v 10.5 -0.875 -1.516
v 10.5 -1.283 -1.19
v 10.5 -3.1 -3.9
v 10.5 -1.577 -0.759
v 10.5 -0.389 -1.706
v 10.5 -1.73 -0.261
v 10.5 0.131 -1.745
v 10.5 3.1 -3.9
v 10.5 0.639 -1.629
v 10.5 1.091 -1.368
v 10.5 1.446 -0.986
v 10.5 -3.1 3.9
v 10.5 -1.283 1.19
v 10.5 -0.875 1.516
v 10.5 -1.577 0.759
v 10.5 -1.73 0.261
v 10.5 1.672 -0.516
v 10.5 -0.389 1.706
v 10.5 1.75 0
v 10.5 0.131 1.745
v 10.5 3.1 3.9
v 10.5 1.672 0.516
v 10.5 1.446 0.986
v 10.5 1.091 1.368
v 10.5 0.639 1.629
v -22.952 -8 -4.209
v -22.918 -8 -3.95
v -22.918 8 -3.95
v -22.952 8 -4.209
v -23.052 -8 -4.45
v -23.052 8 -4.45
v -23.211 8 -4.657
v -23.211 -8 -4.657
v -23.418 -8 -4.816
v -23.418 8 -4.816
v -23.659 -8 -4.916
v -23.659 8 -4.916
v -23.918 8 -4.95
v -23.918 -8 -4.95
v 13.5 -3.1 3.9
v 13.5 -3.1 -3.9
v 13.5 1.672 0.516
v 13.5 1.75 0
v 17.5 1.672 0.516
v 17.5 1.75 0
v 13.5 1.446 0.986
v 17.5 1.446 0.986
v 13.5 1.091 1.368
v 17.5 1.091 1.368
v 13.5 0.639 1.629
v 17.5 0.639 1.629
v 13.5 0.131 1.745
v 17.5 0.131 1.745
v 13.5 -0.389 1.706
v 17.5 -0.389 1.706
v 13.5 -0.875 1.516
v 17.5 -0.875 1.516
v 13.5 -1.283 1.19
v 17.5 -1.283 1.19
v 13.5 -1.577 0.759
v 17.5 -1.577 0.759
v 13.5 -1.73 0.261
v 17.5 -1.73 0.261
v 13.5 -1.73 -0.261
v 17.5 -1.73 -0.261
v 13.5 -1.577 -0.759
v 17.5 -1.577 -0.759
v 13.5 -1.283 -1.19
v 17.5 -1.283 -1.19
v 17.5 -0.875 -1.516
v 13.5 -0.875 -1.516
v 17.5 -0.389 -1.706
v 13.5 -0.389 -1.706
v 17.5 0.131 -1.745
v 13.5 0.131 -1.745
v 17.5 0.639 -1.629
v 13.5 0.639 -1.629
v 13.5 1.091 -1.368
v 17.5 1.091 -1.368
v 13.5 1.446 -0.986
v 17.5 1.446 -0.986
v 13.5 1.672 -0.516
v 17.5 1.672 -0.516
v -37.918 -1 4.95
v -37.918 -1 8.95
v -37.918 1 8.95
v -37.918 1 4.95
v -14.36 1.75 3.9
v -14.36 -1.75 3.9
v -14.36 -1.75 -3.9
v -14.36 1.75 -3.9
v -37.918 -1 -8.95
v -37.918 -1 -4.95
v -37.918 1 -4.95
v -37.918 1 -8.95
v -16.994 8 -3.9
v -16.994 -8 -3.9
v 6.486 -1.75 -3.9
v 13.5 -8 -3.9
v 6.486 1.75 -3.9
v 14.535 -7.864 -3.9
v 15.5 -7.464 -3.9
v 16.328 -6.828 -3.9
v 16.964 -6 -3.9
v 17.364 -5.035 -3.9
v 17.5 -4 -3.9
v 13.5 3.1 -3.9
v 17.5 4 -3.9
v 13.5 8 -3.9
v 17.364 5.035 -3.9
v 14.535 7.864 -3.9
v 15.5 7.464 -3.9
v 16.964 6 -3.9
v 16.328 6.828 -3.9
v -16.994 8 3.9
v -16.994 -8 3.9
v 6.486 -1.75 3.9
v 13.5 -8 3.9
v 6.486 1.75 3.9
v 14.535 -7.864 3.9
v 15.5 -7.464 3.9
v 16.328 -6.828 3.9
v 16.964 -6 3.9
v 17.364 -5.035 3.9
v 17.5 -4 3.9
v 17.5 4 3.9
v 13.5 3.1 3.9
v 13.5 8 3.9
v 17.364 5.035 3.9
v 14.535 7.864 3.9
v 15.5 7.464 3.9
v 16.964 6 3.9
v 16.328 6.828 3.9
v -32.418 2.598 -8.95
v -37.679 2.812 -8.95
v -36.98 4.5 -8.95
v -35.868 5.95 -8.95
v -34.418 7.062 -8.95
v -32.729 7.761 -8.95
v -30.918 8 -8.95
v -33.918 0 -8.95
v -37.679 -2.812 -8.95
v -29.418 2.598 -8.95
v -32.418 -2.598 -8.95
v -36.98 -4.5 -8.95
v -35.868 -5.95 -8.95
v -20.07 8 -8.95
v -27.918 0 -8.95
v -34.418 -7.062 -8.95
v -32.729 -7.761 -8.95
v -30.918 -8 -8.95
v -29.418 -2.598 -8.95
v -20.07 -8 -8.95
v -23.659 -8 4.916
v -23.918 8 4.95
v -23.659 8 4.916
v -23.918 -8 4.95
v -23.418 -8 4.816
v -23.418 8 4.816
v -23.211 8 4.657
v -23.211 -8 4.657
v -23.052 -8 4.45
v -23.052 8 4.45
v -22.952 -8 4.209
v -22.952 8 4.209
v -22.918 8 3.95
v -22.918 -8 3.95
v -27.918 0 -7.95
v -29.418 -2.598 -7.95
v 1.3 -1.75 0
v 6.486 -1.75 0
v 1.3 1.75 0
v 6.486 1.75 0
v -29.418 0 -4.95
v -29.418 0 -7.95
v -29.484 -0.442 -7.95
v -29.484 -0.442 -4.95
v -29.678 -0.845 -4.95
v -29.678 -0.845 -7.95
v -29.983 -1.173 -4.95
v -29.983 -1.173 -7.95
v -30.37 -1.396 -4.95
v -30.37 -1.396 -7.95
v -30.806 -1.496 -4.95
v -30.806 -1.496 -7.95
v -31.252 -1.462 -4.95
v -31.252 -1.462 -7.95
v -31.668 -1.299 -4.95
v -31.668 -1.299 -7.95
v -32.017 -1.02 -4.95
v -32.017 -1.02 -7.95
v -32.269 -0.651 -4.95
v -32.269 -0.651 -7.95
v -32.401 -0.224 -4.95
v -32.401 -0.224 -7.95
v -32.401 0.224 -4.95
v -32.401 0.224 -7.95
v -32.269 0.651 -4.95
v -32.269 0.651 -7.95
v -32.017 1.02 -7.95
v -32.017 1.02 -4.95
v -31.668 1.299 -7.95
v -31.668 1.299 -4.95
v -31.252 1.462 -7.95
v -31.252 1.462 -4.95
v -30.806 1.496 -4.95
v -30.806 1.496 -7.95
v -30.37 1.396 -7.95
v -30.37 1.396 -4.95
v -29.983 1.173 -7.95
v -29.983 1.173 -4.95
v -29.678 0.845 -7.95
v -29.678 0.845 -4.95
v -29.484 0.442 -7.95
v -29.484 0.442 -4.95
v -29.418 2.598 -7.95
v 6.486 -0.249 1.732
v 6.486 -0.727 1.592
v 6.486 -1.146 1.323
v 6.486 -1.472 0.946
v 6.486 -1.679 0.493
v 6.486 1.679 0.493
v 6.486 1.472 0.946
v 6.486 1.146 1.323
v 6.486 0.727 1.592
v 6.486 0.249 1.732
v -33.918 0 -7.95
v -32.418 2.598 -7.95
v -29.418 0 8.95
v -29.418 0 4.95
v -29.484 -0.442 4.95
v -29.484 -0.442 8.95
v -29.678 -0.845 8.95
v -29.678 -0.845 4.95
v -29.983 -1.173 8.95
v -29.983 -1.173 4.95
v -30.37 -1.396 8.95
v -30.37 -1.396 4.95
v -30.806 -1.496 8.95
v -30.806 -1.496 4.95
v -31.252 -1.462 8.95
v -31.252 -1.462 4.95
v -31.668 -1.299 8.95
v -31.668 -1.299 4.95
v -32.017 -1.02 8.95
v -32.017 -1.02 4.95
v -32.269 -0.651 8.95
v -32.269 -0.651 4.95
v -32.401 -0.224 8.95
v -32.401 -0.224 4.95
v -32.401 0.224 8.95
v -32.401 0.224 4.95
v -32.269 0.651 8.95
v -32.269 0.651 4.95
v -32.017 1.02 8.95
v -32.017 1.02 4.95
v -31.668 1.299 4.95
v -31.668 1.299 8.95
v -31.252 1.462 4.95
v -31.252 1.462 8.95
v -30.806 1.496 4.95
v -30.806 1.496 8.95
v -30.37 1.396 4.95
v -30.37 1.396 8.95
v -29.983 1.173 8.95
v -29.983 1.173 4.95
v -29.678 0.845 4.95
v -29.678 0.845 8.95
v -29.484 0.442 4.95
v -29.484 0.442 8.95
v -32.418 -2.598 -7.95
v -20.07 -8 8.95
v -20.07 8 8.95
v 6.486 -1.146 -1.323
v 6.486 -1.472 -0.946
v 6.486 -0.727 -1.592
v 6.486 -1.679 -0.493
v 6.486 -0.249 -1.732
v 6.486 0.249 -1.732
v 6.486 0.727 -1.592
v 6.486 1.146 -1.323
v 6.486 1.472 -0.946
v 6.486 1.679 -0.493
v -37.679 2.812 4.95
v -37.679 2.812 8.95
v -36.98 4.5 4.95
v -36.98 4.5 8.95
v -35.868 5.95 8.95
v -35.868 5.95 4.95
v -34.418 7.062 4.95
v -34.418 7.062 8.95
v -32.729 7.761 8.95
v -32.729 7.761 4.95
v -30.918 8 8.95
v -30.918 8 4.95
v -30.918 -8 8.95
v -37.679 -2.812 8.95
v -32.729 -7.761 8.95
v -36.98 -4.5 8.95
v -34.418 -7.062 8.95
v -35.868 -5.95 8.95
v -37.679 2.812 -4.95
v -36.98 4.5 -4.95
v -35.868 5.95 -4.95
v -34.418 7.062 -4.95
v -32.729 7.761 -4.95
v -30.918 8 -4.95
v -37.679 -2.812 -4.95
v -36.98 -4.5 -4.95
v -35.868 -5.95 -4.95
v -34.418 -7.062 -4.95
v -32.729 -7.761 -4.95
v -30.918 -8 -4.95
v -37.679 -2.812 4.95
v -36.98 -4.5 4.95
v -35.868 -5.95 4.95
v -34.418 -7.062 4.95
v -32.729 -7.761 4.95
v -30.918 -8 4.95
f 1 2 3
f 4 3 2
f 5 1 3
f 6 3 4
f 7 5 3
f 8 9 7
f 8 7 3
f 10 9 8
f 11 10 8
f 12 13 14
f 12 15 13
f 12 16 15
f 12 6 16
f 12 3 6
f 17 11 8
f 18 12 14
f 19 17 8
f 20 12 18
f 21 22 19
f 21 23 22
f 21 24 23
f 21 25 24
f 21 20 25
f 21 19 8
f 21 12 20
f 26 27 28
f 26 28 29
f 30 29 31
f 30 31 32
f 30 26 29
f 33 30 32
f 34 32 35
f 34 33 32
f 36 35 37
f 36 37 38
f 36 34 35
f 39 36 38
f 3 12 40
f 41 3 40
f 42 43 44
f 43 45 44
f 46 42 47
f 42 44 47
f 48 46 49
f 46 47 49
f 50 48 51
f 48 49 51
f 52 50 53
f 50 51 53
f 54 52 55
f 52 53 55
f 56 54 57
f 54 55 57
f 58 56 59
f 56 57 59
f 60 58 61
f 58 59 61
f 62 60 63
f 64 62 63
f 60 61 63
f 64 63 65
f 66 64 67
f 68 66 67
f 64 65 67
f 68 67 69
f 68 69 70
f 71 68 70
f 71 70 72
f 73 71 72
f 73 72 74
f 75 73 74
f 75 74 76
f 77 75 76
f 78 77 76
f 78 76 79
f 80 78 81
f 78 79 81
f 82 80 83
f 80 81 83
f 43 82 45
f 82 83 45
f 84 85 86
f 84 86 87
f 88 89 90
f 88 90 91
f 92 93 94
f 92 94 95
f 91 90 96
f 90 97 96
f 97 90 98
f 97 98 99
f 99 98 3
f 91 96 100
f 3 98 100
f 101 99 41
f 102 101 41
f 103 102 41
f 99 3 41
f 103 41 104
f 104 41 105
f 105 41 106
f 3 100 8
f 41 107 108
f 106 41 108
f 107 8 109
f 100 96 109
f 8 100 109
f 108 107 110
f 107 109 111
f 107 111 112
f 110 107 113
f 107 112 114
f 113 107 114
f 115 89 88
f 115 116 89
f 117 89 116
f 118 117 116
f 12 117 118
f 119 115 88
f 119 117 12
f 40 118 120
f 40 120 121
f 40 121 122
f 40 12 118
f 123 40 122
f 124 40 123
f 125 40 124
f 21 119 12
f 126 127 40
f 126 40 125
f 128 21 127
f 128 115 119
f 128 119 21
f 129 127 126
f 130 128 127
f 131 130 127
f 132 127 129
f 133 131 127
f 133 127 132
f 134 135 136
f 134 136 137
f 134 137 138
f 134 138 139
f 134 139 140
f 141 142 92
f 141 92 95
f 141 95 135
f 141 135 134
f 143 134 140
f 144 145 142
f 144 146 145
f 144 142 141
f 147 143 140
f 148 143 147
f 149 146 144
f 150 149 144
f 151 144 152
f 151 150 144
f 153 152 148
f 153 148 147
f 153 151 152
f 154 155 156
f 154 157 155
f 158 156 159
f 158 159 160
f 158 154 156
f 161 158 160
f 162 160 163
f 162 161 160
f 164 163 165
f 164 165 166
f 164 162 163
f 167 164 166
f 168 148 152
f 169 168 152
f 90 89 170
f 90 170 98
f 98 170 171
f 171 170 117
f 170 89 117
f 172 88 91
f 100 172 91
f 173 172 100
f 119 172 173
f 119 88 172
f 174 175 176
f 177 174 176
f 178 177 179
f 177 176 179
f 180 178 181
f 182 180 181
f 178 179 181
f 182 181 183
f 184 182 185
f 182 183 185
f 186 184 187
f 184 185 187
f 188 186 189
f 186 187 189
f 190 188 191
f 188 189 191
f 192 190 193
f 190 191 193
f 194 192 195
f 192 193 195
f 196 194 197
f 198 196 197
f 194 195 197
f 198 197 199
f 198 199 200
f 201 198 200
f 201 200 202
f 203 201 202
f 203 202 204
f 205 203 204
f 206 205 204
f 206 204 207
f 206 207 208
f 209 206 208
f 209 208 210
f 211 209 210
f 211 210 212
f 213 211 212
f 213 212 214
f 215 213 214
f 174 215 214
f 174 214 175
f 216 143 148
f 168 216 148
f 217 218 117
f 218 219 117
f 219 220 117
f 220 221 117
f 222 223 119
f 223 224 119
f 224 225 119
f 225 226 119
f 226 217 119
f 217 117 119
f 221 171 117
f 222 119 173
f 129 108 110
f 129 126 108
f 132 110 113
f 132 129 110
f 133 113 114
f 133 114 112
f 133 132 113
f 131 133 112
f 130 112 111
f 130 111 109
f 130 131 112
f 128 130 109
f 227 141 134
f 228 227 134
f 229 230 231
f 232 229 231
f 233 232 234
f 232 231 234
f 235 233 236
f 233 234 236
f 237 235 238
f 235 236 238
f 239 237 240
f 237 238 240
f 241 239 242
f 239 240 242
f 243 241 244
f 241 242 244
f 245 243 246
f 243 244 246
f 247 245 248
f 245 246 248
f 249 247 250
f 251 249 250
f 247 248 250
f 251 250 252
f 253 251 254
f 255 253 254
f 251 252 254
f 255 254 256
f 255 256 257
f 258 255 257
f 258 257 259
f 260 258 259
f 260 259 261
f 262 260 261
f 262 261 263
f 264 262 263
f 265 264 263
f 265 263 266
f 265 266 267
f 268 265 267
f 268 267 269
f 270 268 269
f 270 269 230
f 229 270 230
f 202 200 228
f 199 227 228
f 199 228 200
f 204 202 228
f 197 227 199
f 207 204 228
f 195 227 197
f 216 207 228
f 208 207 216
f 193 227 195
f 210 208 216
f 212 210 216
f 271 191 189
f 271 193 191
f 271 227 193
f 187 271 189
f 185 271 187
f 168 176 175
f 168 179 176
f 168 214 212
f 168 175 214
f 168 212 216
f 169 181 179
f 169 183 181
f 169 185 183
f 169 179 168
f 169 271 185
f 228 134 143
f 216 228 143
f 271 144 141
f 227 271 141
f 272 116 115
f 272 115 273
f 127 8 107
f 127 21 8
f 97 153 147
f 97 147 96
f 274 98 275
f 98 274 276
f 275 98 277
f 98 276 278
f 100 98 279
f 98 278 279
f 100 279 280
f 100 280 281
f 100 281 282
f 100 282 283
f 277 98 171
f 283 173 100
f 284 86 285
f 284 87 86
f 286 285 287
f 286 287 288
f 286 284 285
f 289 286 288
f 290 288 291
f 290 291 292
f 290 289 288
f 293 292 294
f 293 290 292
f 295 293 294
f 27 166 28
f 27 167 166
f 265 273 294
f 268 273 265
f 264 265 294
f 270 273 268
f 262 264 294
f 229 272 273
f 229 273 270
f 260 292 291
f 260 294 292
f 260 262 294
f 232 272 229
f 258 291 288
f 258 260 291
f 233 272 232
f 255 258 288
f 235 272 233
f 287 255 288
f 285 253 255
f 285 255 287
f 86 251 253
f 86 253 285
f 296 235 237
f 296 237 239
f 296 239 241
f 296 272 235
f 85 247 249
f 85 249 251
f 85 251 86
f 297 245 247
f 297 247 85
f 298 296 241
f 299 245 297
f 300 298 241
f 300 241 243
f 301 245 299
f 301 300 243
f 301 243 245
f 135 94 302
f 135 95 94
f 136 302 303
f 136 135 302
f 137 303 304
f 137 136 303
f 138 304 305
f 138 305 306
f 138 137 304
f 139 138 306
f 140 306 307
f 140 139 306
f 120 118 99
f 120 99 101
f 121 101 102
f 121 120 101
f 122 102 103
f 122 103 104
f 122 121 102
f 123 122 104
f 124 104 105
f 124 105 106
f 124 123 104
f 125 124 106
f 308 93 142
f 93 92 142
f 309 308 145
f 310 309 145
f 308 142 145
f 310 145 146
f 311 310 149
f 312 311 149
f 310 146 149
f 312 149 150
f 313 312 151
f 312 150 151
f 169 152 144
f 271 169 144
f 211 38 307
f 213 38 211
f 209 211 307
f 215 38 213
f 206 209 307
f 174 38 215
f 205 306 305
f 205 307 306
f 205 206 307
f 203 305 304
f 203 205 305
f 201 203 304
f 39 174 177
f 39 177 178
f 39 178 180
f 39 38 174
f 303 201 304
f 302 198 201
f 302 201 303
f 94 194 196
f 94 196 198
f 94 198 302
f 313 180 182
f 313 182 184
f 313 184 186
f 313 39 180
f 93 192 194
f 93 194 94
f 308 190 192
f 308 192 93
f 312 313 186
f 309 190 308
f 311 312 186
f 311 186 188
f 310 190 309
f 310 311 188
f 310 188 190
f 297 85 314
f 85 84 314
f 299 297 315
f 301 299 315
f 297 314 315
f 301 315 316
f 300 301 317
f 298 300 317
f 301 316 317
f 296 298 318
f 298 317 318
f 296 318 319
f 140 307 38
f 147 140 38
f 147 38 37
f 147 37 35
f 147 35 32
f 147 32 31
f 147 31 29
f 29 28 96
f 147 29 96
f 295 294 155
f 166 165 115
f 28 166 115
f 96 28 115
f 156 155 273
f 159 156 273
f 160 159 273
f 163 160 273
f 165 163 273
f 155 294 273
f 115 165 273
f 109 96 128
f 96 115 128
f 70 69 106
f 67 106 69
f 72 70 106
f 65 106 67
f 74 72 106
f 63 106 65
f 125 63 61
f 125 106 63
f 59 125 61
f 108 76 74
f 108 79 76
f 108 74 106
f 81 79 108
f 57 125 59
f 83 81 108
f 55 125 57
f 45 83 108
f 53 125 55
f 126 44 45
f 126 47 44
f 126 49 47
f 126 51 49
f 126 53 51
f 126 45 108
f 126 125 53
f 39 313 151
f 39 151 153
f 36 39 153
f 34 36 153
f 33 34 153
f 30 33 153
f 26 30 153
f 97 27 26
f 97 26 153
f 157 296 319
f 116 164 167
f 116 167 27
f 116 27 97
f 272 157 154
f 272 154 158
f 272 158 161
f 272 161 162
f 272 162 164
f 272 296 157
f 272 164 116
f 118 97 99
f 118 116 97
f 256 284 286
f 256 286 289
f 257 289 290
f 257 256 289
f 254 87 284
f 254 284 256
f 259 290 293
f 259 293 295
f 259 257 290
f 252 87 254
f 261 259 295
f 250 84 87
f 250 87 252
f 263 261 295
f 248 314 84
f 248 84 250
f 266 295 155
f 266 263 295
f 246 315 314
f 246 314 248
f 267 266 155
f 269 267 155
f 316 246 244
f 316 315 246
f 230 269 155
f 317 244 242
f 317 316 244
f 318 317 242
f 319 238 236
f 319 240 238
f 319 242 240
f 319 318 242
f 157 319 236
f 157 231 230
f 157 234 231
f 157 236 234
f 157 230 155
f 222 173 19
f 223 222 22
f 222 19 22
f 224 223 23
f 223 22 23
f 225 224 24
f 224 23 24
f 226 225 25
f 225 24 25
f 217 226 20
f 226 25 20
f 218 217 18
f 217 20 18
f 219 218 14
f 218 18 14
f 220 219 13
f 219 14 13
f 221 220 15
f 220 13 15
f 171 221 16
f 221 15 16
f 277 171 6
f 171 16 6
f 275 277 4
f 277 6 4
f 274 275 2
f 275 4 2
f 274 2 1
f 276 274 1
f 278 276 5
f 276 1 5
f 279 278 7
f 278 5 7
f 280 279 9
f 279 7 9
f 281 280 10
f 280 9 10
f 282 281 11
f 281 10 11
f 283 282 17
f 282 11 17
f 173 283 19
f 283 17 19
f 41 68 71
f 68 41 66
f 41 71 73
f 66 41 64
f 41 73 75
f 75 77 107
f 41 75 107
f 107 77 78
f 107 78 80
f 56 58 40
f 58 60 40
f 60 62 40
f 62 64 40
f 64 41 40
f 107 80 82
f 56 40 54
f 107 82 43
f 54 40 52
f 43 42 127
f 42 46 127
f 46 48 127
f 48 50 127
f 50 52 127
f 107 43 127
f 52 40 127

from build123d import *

# Parameters (mm, degrees)
F0_W          = 20.846172
F0_H          = 3.5
F0_W_2        = 3
F0_H_2        = 6.2
F1_DEPTH      = 3.9
F1_DEPTH_BACK = 3.9
F2_R          = 1.75
F3_DEPTH      = 16.2
F5_DEPTH      = 8
F5_DEPTH_BACK = 8
F6_R          = 7
F7_R          = 1.5
F8_DEPTH      = 25
F9_R          = 1.5
F10_DEPTH     = 1


with BuildPart() as f1:
    # F0 (on Top) → F1 (new body, two sides)
    with BuildSketch(Plane.XY) as f1_sk:
        with BuildLine():
            Line((-17.5, 8), (-17.5, -8))
            Line((-17.5, -8), (13.5, -8))
            ThreePointArc((13.5, -8), (16.328427, -6.828427), (17.5, -4))
            Line((17.5, -4), (17.5, 4))
            ThreePointArc((17.5, 4), (16.328427, 6.828427), (13.5, 8))
            Line((13.5, 8), (-17.5, 8))
        make_face()
        with Locations((-3.937322, 0)):
            Rectangle(F0_W, F0_H, mode=Mode.SUBTRACT)
        with Locations((12, 0)):
            Rectangle(F0_W_2, F0_H_2, mode=Mode.SUBTRACT)
    extrude(amount=F1_DEPTH)
    extrude(f1_sk.sketch, amount=-F1_DEPTH_BACK)

    # F2 (on face) → F3 (cut)
    with BuildSketch(Plane.YZ.offset(17.5)):
        Circle(F2_R)
    extrude(amount=-F3_DEPTH, mode=Mode.SUBTRACT)

    # F4 (on Front) → F5 (join, two sides)
    with BuildSketch(Plane.XZ) as f5_sk:
        with BuildLine():
            Line((-22.917766, 3.95), (-22.917766, -3.95))
            ThreePointArc((-22.917766, -3.95), (-23.210659, -4.657107), (-23.917766, -4.95))
            Line((-23.917766, -4.95), (-37.917766, -4.95))
            Line((-37.917766, -4.95), (-37.917766, -8.95))
            Line((-37.917766, -8.95), (-20.07043, -8.95))
            Line((-20.07043, -8.95), (-16.954886, -3.836561))
            Line((-16.954886, -3.836561), (-16.954886, 3.836561))
            Line((-16.954886, 3.836561), (-20.07043, 8.95))
            Line((-20.07043, 8.95), (-37.917766, 8.95))
            Line((-37.917766, 8.95), (-37.917766, 4.95))
            Line((-37.917766, 4.95), (-23.917766, 4.95))
            ThreePointArc((-23.917766, 4.95), (-23.210659, 4.657107), (-22.917766, 3.95))
        make_face()
    extrude(amount=F5_DEPTH)
    extrude(f5_sk.sketch, amount=-F5_DEPTH_BACK)

    # F6
    f6_edges = [f1.edges().sort_by_distance(p)[0] for p in [
        (-37.917766, -8, -6.95),
        (-37.917766, -8, 6.95),
        (-37.917766, 8, 6.95),
        (-37.917766, 8, -6.95),
    ]]
    fillet(f6_edges, radius=F6_R)

    # F7 (on face) → F8 (cut)
    with BuildSketch(Plane(origin=(0, 0, -8.95), x_dir=(1, 0, 0), z_dir=(0, 0, -1))):
        with Locations((-30.917766, 0)):
            Circle(F7_R)
    extrude(amount=-F8_DEPTH, mode=Mode.SUBTRACT)

    # F9 (on face) → F10 (cut)
    with BuildSketch(Plane(origin=(0, 0, -8.95), x_dir=(1, 0, 0), z_dir=(0, 0, -1))):
        Polygon((-29.417766, -2.598076), (-27.917766, 0), (-29.417766, 2.598076), (-32.417766, 2.598076), (-33.917766, 0), (-32.417766, -2.598076), align=None)
        with Locations((-30.917766, 0)):
            Circle(F9_R, mode=Mode.SUBTRACT)
    extrude(amount=-F10_DEPTH, mode=Mode.SUBTRACT)


solid = f1.part
